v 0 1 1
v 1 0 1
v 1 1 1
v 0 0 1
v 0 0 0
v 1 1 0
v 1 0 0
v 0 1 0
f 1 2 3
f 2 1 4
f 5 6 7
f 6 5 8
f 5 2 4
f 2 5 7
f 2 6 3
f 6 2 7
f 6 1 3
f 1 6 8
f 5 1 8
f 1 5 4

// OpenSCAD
cube();
/***********************************************
*********      SolidPython code:      **********
************************************************
 
#! /usr/bin/env python3
from solid import scad_render_animated, scad_render_to_file, cube
from typing import List

def main():
    a = cube()
    scad_render_to_file(a)

if __name__ == '__main__':
    main()
 
 
************************************************/
